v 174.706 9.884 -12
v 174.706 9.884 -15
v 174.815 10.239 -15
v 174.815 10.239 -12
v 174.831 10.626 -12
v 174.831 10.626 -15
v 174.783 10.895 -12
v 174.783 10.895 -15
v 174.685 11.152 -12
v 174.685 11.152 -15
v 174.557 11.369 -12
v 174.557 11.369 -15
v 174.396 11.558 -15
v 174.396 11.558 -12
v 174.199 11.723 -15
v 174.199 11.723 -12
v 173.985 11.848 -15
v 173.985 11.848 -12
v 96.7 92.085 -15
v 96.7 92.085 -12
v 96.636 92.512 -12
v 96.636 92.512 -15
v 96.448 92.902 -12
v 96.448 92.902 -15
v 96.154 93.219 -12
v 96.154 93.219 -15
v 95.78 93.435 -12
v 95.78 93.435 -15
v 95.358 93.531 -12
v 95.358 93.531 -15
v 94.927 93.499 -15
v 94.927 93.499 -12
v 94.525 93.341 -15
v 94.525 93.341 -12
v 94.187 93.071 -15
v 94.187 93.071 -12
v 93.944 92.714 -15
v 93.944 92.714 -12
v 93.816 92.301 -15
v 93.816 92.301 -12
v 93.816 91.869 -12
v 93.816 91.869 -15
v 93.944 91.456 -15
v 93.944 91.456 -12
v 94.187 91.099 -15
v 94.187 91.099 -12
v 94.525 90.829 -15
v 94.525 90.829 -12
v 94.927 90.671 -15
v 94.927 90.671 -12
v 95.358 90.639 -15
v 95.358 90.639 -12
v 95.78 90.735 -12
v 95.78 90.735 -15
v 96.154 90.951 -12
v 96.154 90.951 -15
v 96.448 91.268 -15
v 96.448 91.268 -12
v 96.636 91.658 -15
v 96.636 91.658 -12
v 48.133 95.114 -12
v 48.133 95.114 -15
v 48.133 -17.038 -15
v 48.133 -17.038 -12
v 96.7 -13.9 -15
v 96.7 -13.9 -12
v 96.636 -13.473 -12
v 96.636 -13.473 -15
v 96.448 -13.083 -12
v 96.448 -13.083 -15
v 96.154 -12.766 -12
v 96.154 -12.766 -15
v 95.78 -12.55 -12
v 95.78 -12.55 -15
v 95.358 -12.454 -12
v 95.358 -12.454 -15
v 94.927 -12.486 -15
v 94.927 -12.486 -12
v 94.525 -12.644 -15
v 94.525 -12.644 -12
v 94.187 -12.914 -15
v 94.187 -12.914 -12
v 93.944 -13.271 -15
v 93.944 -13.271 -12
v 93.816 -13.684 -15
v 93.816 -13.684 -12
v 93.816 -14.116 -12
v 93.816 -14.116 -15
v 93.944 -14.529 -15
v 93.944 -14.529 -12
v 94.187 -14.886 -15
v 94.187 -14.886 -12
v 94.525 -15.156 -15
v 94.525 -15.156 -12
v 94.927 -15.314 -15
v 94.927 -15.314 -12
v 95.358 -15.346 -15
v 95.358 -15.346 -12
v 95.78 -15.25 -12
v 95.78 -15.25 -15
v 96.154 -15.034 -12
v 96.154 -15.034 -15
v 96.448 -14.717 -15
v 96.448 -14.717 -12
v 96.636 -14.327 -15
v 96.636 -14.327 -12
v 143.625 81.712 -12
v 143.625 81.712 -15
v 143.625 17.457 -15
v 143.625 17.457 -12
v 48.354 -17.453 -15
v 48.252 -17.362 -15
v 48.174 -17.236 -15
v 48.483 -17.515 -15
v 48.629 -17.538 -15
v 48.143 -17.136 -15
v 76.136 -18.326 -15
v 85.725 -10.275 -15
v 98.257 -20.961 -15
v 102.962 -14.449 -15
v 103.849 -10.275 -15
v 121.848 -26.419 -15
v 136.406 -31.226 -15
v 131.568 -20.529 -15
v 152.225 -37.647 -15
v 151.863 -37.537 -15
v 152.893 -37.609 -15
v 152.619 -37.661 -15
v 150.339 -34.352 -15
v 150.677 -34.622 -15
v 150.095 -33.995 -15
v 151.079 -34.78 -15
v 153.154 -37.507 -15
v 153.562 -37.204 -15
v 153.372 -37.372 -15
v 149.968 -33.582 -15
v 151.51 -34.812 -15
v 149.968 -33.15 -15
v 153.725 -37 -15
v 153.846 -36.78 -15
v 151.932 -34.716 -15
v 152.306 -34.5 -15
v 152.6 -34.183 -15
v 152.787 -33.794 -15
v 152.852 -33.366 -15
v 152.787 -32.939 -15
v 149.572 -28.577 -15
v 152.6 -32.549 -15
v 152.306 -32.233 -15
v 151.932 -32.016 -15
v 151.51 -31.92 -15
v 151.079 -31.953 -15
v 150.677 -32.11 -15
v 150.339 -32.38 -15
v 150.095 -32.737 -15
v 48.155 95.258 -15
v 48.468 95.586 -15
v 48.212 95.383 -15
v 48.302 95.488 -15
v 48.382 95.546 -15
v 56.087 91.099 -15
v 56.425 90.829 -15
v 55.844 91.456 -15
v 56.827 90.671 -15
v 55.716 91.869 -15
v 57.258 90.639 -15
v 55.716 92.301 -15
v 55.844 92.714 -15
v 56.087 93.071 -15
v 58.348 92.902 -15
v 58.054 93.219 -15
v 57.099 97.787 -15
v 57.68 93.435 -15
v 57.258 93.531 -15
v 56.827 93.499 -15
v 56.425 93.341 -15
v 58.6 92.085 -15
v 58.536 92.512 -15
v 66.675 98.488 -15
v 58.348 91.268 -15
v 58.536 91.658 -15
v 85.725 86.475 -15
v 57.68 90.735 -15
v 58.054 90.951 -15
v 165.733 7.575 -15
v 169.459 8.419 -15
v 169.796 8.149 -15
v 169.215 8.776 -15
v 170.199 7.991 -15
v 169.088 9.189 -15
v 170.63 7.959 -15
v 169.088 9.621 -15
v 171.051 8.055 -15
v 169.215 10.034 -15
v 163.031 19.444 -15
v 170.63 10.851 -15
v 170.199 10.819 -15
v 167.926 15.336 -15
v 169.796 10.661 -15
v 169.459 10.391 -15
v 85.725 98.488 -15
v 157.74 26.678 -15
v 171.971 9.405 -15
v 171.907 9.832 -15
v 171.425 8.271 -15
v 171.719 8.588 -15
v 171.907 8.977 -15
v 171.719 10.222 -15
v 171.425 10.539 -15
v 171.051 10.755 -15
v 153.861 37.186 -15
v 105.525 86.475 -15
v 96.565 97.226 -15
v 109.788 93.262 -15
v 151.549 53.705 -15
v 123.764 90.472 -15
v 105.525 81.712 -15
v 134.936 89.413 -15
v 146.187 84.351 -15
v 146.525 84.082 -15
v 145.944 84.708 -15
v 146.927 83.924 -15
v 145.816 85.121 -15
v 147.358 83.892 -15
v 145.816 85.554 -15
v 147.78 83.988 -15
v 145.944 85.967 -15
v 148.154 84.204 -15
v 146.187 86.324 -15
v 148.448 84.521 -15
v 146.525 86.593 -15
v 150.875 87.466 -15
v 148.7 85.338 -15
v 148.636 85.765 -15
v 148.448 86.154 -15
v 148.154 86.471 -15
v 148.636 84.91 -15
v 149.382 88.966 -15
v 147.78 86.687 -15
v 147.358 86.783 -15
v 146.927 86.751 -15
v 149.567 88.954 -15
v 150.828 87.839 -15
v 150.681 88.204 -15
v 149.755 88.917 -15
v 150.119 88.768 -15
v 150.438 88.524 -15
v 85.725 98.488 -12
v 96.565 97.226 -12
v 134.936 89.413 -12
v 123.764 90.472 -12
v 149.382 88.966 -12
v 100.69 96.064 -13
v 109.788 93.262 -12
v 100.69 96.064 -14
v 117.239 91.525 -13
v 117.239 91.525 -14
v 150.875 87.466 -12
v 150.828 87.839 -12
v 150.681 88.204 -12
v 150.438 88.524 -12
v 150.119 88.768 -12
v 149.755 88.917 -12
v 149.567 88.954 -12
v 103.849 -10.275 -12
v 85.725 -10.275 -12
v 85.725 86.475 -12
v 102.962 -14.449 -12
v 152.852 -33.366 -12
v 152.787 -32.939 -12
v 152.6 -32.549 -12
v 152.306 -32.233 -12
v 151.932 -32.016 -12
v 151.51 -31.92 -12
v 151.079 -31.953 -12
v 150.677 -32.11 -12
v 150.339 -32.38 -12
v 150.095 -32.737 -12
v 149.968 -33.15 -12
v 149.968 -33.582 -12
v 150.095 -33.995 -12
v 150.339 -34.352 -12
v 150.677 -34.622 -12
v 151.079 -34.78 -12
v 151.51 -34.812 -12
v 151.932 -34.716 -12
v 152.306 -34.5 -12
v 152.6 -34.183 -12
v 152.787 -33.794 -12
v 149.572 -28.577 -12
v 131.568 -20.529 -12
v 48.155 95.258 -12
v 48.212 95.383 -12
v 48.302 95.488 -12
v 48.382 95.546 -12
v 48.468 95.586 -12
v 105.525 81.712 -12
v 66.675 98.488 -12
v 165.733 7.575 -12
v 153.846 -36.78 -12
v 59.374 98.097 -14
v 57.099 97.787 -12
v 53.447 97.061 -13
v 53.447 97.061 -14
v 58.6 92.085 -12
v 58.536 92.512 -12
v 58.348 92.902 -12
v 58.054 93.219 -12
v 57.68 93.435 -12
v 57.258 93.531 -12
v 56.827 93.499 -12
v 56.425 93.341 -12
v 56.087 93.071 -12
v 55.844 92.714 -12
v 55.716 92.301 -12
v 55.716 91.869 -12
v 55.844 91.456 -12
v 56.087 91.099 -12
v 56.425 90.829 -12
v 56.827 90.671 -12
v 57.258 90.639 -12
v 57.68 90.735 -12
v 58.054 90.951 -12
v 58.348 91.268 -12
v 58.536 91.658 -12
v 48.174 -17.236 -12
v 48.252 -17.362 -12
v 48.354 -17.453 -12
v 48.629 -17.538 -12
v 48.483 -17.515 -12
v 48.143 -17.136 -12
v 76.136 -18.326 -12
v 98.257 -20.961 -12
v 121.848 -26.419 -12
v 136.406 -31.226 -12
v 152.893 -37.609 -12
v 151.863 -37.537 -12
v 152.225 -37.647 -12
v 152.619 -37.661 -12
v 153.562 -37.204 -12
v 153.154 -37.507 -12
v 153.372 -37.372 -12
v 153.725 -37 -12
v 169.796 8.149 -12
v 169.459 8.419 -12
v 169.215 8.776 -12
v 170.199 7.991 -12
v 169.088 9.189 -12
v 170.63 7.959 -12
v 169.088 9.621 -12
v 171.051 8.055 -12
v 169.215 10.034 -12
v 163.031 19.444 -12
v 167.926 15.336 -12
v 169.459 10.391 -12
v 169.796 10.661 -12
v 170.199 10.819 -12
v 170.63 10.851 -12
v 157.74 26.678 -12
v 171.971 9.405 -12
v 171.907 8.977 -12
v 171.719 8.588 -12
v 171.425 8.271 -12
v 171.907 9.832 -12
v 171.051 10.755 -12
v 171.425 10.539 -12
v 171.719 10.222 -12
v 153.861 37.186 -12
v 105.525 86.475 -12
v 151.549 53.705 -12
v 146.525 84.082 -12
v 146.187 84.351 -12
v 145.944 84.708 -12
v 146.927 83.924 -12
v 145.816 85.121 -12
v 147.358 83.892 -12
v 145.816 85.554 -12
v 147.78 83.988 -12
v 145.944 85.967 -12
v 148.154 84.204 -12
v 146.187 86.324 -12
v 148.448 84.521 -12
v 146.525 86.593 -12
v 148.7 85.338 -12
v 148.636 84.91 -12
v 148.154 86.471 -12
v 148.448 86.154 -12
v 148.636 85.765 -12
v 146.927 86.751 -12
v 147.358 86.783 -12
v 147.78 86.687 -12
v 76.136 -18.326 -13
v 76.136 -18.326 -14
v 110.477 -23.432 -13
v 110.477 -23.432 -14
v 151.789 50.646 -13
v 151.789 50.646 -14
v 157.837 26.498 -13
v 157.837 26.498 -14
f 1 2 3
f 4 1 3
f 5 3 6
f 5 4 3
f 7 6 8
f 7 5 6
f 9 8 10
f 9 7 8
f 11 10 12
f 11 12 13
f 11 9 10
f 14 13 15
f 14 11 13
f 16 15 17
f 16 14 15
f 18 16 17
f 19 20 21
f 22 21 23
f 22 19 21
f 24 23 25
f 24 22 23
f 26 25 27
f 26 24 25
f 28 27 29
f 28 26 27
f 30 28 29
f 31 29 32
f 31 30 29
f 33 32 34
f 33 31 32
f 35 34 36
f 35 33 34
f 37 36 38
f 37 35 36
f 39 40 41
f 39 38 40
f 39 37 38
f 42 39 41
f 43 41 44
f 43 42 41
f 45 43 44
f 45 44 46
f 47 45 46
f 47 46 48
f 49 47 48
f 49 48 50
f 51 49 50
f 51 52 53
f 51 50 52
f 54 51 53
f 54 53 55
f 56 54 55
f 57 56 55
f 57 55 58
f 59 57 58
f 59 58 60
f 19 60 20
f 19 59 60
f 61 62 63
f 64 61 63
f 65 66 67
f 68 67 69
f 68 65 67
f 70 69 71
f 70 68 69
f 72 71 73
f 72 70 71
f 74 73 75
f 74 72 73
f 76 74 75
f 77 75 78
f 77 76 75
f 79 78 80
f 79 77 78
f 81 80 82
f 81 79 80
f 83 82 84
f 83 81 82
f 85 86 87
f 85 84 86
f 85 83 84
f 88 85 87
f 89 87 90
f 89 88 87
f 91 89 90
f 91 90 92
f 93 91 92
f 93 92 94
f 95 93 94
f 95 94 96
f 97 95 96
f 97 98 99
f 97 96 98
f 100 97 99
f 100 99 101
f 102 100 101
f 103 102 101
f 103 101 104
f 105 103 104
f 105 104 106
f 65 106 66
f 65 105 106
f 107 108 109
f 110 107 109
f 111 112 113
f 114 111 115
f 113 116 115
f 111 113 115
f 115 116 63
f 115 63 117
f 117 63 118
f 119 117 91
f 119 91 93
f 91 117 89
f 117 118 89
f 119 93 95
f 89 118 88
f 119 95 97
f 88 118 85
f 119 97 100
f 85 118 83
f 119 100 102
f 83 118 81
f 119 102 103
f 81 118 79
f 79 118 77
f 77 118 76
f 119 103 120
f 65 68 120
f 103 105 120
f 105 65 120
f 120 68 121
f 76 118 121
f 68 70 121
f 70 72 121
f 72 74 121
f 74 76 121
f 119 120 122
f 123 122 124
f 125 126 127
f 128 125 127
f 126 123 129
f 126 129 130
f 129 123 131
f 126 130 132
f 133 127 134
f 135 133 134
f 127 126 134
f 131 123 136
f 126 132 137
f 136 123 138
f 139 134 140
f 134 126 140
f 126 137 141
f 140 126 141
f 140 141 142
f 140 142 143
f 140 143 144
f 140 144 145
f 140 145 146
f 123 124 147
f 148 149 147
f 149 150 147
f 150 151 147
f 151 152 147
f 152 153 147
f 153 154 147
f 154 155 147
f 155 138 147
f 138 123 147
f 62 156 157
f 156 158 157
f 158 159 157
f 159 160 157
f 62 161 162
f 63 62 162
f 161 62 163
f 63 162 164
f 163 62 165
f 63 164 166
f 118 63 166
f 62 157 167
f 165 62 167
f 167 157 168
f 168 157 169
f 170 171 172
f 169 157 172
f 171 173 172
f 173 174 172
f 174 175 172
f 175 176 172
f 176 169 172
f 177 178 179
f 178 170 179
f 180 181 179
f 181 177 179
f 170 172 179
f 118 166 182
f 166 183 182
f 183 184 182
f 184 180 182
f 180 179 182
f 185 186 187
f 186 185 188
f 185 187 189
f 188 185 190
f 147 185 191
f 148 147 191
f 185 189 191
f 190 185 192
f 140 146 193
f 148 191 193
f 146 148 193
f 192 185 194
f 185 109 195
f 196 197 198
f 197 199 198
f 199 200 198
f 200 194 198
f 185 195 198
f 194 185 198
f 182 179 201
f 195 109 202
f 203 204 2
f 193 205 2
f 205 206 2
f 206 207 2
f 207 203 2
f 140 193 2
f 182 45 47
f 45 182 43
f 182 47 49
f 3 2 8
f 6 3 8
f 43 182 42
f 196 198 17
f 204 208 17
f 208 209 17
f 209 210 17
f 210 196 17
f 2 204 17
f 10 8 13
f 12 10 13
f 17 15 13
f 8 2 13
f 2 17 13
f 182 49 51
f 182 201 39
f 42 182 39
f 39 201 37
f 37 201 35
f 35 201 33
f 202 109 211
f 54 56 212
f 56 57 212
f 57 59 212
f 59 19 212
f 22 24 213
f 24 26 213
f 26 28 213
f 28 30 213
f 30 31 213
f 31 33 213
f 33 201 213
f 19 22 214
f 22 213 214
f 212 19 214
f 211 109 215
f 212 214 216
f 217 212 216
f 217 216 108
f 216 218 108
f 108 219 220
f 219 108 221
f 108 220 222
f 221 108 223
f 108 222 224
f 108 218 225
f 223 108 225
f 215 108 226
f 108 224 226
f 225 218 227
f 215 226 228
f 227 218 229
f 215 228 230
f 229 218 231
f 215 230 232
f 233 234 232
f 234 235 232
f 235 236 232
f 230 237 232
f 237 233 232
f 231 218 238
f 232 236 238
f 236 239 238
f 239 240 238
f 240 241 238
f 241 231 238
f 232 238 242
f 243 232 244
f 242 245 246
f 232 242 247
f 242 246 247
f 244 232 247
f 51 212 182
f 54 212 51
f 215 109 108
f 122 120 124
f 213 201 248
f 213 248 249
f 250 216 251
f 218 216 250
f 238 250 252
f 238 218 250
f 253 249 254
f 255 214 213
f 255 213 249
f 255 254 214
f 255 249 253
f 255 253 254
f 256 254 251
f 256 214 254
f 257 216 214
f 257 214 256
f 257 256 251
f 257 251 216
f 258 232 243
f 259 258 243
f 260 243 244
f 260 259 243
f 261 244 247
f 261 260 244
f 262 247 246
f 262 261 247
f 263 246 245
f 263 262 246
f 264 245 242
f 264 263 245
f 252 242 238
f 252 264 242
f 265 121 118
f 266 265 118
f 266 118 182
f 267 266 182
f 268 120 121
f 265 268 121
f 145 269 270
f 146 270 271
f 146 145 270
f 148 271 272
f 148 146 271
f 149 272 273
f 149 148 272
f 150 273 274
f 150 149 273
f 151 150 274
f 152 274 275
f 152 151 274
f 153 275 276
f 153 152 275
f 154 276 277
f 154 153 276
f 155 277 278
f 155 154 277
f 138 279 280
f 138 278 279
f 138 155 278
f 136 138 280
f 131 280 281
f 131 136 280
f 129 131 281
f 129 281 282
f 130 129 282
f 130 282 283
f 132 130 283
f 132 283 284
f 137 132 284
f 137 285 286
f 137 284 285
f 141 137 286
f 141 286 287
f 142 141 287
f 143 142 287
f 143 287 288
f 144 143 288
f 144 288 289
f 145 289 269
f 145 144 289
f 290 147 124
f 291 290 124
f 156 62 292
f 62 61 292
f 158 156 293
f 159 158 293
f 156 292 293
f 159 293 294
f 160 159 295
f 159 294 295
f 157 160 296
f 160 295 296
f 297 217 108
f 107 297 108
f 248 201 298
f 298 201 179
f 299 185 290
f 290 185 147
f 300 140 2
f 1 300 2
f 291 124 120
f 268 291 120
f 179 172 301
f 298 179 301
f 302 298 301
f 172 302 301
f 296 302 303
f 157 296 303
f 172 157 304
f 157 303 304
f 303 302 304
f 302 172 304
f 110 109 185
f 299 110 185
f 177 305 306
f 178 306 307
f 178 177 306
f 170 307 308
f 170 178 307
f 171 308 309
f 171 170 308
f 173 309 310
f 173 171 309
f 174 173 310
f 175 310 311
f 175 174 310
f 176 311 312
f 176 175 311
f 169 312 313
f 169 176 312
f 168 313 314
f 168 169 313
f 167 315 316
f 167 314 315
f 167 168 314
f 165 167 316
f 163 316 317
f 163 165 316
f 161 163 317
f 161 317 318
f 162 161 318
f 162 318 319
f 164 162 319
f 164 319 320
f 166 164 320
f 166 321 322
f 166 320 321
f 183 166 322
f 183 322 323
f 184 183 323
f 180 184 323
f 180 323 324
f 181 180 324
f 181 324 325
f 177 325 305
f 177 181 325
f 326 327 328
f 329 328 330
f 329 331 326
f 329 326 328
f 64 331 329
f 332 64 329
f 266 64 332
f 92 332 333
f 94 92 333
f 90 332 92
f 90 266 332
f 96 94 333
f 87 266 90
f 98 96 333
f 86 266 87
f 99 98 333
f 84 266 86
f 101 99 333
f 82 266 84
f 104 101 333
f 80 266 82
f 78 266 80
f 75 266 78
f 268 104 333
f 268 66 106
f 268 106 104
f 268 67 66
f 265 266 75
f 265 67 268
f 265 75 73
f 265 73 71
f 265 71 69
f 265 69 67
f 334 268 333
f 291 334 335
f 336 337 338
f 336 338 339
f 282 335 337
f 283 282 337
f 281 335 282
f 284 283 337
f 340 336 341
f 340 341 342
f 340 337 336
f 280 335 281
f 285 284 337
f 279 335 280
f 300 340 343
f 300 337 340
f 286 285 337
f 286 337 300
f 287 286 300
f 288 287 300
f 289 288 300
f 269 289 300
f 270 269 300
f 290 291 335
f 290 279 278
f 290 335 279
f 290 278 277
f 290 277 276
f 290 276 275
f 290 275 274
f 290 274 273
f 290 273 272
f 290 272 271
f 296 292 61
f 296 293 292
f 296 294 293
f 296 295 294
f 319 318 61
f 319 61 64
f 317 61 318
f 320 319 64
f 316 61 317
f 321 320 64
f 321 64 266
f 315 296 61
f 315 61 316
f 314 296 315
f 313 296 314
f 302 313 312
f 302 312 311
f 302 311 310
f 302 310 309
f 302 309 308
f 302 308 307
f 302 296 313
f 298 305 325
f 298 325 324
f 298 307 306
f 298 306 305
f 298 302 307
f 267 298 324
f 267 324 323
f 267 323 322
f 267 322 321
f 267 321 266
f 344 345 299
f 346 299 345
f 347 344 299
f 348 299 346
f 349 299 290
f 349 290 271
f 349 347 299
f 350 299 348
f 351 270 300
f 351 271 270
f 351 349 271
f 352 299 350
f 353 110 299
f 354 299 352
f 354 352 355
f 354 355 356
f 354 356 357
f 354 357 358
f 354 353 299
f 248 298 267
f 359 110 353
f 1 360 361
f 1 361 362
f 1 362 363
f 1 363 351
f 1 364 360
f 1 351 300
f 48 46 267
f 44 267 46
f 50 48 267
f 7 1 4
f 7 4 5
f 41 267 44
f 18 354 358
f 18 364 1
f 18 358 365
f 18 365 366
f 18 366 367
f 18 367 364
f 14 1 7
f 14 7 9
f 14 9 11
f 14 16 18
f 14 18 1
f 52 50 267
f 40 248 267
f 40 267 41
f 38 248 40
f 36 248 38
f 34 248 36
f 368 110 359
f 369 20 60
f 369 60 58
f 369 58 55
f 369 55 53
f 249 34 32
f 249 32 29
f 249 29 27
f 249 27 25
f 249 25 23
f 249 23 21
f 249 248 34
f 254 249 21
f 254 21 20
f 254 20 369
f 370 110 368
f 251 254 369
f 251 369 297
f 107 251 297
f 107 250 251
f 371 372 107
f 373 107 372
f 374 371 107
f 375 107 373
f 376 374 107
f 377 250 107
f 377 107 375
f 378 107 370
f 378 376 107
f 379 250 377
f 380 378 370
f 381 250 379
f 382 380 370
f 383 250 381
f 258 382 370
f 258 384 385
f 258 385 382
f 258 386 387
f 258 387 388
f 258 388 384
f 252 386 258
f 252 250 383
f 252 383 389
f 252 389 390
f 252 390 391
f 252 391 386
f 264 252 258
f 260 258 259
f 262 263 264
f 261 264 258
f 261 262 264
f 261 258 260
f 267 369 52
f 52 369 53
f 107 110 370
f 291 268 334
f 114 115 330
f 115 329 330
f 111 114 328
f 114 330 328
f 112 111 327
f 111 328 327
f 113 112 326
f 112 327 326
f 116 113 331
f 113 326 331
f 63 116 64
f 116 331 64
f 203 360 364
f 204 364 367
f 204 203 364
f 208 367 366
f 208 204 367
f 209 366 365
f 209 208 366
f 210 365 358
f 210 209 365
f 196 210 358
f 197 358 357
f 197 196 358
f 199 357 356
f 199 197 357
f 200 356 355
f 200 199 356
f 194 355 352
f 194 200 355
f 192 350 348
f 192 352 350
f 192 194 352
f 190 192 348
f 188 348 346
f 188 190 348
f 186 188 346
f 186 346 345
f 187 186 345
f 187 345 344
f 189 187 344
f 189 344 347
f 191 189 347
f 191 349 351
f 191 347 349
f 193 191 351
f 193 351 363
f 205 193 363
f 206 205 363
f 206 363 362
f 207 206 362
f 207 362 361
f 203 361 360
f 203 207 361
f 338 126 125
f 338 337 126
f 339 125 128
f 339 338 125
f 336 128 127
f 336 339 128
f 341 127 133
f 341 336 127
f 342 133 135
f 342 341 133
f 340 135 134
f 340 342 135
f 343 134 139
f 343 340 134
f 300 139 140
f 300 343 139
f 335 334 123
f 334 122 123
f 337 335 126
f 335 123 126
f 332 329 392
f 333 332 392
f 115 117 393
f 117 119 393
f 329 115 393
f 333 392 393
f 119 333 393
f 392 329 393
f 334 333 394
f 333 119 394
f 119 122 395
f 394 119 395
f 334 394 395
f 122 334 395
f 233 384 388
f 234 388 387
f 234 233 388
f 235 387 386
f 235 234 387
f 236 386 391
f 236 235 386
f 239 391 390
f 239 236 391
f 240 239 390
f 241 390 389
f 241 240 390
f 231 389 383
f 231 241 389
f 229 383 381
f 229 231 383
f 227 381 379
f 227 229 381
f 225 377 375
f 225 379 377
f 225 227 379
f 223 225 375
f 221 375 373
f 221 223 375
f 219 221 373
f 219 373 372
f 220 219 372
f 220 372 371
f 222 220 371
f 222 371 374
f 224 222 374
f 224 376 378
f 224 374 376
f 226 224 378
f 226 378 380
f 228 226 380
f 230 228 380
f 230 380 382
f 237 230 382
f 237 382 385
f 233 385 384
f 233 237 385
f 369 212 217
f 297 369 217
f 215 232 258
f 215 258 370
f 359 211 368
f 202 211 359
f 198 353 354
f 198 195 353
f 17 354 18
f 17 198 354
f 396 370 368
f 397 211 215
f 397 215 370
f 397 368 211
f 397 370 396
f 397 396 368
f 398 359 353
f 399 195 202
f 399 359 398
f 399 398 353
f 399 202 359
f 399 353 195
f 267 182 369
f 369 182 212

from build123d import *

# Parameters (mm, degrees)
PAD009_DEPTH    = 3
POCKET012_DEPTH = 5
SKETCH044_R     = 1.45
POCKET016_DEPTH = 22
FILLET007_R     = 1.5
FILLET015_R     = 0.5


with BuildPart() as part:
    # Sketch032 → Pad009 (new body)
    with BuildSketch(Plane.XY):
        with BuildLine():
            add(Edge.make_bspline(
                [(48.133333, -17.5342), (72.566704, -17.735607), (107.262527, -17.223288), (153.231854, -38.154949)],
                knots=[0, 0, 0, 0, 1, 1, 1, 1], degree=3))
            Line((153.231854, -38.154949), (175.310198, 11.234895))
            add(Edge.make_bspline(
                [(150.875, 88.9625), (150.875, 42.8625), (150.875, 22.157965), (175.310198, 11.234895)],
                knots=[0, 0, 0, 0, 1, 1, 1, 1], degree=3))
            add(Edge.make_bspline(
                [(85.725, 98.4875), (104.775, 98.4875), (104.775, 88.9625), (150.875, 88.9625)],
                knots=[0, 0, 0, 0, 1, 1, 1, 1], degree=3))
            Line((85.725, 98.4875), (66.675, 98.4875))
            add(Edge.make_bspline(
                [(66.675, 98.4875), (58.346897, 98.489647), (52.856461, 97.147667), (48.133333, 95.467873)],
                knots=[0, 0, 0, 0, 1, 1, 1, 1], degree=3))
            Line((48.133333, 95.467873), (48.133333, -17.5342))
        make_face()
    extrude(amount=PAD009_DEPTH)

    # Sketch033 → Pocket012 (cut)
    with BuildSketch(Plane(origin=(0, 0, 0), x_dir=(1, 0, 0), z_dir=(0, 0, -1))):
        Polygon((85.725, -86.475), (105.525, -86.475), (105.525, -81.7125), (143.625, -81.7125), (143.625, -17.457464), (165.732668, -7.574851), (149.57181, 28.577419), (131.568158, 20.529392), (102.96164, 14.448889), (103.848827, 10.275), (85.725, 10.275), align=None)
    extrude(amount=-POCKET012_DEPTH, mode=Mode.SUBTRACT)

    # Sketch044 → Pocket016 (cut)
    with BuildSketch(Plane.XY):
        with Locations((-4.375, -4.375)):
            Circle(SKETCH044_R)
        with Locations((-4.375, 80.575)):
            Circle(SKETCH044_R)
        with Locations((151.401832, -33.366184)):
            Circle(SKETCH044_R)
        with Locations((170.521433, 9.404873)):
            Circle(SKETCH044_R)
        with Locations((147.25, 85.3375)):
            Circle(SKETCH044_R)
        with Locations((43.25, -13.9)):
            Circle(SKETCH044_R)
        with Locations((57.15, 92.085)):
            Circle(SKETCH044_R)
        with Locations((95.25, 92.085)):
            Circle(SKETCH044_R)
        with Locations((95.25, -13.9)):
            Circle(SKETCH044_R)
    extrude(amount=POCKET016_DEPTH, mode=Mode.SUBTRACT)

    # Fillet007
    fillet007_edges = [part.edges().sort_by_distance(p)[0] for p in [
        (153.231854, -38.154949, 1.5),
        (175.310198, 11.234895, 1.5),
        (150.875, 88.9625, 1.5),
    ]]
    fillet(fillet007_edges, radius=FILLET007_R)

    # Fillet015
    fillet015_edges = [part.edges().sort_by_distance(p)[0] for p in [
        (48.133333, -17.5342, 1.5),
        (48.133333, 95.467873, 1.5),
    ]]
    fillet(fillet015_edges, radius=FILLET015_R)


with BuildPart() as part_1:
    # Body008 placement: moved
    add(part.part.moved(Location((0, 0, -15))))


solid = part_1.part
